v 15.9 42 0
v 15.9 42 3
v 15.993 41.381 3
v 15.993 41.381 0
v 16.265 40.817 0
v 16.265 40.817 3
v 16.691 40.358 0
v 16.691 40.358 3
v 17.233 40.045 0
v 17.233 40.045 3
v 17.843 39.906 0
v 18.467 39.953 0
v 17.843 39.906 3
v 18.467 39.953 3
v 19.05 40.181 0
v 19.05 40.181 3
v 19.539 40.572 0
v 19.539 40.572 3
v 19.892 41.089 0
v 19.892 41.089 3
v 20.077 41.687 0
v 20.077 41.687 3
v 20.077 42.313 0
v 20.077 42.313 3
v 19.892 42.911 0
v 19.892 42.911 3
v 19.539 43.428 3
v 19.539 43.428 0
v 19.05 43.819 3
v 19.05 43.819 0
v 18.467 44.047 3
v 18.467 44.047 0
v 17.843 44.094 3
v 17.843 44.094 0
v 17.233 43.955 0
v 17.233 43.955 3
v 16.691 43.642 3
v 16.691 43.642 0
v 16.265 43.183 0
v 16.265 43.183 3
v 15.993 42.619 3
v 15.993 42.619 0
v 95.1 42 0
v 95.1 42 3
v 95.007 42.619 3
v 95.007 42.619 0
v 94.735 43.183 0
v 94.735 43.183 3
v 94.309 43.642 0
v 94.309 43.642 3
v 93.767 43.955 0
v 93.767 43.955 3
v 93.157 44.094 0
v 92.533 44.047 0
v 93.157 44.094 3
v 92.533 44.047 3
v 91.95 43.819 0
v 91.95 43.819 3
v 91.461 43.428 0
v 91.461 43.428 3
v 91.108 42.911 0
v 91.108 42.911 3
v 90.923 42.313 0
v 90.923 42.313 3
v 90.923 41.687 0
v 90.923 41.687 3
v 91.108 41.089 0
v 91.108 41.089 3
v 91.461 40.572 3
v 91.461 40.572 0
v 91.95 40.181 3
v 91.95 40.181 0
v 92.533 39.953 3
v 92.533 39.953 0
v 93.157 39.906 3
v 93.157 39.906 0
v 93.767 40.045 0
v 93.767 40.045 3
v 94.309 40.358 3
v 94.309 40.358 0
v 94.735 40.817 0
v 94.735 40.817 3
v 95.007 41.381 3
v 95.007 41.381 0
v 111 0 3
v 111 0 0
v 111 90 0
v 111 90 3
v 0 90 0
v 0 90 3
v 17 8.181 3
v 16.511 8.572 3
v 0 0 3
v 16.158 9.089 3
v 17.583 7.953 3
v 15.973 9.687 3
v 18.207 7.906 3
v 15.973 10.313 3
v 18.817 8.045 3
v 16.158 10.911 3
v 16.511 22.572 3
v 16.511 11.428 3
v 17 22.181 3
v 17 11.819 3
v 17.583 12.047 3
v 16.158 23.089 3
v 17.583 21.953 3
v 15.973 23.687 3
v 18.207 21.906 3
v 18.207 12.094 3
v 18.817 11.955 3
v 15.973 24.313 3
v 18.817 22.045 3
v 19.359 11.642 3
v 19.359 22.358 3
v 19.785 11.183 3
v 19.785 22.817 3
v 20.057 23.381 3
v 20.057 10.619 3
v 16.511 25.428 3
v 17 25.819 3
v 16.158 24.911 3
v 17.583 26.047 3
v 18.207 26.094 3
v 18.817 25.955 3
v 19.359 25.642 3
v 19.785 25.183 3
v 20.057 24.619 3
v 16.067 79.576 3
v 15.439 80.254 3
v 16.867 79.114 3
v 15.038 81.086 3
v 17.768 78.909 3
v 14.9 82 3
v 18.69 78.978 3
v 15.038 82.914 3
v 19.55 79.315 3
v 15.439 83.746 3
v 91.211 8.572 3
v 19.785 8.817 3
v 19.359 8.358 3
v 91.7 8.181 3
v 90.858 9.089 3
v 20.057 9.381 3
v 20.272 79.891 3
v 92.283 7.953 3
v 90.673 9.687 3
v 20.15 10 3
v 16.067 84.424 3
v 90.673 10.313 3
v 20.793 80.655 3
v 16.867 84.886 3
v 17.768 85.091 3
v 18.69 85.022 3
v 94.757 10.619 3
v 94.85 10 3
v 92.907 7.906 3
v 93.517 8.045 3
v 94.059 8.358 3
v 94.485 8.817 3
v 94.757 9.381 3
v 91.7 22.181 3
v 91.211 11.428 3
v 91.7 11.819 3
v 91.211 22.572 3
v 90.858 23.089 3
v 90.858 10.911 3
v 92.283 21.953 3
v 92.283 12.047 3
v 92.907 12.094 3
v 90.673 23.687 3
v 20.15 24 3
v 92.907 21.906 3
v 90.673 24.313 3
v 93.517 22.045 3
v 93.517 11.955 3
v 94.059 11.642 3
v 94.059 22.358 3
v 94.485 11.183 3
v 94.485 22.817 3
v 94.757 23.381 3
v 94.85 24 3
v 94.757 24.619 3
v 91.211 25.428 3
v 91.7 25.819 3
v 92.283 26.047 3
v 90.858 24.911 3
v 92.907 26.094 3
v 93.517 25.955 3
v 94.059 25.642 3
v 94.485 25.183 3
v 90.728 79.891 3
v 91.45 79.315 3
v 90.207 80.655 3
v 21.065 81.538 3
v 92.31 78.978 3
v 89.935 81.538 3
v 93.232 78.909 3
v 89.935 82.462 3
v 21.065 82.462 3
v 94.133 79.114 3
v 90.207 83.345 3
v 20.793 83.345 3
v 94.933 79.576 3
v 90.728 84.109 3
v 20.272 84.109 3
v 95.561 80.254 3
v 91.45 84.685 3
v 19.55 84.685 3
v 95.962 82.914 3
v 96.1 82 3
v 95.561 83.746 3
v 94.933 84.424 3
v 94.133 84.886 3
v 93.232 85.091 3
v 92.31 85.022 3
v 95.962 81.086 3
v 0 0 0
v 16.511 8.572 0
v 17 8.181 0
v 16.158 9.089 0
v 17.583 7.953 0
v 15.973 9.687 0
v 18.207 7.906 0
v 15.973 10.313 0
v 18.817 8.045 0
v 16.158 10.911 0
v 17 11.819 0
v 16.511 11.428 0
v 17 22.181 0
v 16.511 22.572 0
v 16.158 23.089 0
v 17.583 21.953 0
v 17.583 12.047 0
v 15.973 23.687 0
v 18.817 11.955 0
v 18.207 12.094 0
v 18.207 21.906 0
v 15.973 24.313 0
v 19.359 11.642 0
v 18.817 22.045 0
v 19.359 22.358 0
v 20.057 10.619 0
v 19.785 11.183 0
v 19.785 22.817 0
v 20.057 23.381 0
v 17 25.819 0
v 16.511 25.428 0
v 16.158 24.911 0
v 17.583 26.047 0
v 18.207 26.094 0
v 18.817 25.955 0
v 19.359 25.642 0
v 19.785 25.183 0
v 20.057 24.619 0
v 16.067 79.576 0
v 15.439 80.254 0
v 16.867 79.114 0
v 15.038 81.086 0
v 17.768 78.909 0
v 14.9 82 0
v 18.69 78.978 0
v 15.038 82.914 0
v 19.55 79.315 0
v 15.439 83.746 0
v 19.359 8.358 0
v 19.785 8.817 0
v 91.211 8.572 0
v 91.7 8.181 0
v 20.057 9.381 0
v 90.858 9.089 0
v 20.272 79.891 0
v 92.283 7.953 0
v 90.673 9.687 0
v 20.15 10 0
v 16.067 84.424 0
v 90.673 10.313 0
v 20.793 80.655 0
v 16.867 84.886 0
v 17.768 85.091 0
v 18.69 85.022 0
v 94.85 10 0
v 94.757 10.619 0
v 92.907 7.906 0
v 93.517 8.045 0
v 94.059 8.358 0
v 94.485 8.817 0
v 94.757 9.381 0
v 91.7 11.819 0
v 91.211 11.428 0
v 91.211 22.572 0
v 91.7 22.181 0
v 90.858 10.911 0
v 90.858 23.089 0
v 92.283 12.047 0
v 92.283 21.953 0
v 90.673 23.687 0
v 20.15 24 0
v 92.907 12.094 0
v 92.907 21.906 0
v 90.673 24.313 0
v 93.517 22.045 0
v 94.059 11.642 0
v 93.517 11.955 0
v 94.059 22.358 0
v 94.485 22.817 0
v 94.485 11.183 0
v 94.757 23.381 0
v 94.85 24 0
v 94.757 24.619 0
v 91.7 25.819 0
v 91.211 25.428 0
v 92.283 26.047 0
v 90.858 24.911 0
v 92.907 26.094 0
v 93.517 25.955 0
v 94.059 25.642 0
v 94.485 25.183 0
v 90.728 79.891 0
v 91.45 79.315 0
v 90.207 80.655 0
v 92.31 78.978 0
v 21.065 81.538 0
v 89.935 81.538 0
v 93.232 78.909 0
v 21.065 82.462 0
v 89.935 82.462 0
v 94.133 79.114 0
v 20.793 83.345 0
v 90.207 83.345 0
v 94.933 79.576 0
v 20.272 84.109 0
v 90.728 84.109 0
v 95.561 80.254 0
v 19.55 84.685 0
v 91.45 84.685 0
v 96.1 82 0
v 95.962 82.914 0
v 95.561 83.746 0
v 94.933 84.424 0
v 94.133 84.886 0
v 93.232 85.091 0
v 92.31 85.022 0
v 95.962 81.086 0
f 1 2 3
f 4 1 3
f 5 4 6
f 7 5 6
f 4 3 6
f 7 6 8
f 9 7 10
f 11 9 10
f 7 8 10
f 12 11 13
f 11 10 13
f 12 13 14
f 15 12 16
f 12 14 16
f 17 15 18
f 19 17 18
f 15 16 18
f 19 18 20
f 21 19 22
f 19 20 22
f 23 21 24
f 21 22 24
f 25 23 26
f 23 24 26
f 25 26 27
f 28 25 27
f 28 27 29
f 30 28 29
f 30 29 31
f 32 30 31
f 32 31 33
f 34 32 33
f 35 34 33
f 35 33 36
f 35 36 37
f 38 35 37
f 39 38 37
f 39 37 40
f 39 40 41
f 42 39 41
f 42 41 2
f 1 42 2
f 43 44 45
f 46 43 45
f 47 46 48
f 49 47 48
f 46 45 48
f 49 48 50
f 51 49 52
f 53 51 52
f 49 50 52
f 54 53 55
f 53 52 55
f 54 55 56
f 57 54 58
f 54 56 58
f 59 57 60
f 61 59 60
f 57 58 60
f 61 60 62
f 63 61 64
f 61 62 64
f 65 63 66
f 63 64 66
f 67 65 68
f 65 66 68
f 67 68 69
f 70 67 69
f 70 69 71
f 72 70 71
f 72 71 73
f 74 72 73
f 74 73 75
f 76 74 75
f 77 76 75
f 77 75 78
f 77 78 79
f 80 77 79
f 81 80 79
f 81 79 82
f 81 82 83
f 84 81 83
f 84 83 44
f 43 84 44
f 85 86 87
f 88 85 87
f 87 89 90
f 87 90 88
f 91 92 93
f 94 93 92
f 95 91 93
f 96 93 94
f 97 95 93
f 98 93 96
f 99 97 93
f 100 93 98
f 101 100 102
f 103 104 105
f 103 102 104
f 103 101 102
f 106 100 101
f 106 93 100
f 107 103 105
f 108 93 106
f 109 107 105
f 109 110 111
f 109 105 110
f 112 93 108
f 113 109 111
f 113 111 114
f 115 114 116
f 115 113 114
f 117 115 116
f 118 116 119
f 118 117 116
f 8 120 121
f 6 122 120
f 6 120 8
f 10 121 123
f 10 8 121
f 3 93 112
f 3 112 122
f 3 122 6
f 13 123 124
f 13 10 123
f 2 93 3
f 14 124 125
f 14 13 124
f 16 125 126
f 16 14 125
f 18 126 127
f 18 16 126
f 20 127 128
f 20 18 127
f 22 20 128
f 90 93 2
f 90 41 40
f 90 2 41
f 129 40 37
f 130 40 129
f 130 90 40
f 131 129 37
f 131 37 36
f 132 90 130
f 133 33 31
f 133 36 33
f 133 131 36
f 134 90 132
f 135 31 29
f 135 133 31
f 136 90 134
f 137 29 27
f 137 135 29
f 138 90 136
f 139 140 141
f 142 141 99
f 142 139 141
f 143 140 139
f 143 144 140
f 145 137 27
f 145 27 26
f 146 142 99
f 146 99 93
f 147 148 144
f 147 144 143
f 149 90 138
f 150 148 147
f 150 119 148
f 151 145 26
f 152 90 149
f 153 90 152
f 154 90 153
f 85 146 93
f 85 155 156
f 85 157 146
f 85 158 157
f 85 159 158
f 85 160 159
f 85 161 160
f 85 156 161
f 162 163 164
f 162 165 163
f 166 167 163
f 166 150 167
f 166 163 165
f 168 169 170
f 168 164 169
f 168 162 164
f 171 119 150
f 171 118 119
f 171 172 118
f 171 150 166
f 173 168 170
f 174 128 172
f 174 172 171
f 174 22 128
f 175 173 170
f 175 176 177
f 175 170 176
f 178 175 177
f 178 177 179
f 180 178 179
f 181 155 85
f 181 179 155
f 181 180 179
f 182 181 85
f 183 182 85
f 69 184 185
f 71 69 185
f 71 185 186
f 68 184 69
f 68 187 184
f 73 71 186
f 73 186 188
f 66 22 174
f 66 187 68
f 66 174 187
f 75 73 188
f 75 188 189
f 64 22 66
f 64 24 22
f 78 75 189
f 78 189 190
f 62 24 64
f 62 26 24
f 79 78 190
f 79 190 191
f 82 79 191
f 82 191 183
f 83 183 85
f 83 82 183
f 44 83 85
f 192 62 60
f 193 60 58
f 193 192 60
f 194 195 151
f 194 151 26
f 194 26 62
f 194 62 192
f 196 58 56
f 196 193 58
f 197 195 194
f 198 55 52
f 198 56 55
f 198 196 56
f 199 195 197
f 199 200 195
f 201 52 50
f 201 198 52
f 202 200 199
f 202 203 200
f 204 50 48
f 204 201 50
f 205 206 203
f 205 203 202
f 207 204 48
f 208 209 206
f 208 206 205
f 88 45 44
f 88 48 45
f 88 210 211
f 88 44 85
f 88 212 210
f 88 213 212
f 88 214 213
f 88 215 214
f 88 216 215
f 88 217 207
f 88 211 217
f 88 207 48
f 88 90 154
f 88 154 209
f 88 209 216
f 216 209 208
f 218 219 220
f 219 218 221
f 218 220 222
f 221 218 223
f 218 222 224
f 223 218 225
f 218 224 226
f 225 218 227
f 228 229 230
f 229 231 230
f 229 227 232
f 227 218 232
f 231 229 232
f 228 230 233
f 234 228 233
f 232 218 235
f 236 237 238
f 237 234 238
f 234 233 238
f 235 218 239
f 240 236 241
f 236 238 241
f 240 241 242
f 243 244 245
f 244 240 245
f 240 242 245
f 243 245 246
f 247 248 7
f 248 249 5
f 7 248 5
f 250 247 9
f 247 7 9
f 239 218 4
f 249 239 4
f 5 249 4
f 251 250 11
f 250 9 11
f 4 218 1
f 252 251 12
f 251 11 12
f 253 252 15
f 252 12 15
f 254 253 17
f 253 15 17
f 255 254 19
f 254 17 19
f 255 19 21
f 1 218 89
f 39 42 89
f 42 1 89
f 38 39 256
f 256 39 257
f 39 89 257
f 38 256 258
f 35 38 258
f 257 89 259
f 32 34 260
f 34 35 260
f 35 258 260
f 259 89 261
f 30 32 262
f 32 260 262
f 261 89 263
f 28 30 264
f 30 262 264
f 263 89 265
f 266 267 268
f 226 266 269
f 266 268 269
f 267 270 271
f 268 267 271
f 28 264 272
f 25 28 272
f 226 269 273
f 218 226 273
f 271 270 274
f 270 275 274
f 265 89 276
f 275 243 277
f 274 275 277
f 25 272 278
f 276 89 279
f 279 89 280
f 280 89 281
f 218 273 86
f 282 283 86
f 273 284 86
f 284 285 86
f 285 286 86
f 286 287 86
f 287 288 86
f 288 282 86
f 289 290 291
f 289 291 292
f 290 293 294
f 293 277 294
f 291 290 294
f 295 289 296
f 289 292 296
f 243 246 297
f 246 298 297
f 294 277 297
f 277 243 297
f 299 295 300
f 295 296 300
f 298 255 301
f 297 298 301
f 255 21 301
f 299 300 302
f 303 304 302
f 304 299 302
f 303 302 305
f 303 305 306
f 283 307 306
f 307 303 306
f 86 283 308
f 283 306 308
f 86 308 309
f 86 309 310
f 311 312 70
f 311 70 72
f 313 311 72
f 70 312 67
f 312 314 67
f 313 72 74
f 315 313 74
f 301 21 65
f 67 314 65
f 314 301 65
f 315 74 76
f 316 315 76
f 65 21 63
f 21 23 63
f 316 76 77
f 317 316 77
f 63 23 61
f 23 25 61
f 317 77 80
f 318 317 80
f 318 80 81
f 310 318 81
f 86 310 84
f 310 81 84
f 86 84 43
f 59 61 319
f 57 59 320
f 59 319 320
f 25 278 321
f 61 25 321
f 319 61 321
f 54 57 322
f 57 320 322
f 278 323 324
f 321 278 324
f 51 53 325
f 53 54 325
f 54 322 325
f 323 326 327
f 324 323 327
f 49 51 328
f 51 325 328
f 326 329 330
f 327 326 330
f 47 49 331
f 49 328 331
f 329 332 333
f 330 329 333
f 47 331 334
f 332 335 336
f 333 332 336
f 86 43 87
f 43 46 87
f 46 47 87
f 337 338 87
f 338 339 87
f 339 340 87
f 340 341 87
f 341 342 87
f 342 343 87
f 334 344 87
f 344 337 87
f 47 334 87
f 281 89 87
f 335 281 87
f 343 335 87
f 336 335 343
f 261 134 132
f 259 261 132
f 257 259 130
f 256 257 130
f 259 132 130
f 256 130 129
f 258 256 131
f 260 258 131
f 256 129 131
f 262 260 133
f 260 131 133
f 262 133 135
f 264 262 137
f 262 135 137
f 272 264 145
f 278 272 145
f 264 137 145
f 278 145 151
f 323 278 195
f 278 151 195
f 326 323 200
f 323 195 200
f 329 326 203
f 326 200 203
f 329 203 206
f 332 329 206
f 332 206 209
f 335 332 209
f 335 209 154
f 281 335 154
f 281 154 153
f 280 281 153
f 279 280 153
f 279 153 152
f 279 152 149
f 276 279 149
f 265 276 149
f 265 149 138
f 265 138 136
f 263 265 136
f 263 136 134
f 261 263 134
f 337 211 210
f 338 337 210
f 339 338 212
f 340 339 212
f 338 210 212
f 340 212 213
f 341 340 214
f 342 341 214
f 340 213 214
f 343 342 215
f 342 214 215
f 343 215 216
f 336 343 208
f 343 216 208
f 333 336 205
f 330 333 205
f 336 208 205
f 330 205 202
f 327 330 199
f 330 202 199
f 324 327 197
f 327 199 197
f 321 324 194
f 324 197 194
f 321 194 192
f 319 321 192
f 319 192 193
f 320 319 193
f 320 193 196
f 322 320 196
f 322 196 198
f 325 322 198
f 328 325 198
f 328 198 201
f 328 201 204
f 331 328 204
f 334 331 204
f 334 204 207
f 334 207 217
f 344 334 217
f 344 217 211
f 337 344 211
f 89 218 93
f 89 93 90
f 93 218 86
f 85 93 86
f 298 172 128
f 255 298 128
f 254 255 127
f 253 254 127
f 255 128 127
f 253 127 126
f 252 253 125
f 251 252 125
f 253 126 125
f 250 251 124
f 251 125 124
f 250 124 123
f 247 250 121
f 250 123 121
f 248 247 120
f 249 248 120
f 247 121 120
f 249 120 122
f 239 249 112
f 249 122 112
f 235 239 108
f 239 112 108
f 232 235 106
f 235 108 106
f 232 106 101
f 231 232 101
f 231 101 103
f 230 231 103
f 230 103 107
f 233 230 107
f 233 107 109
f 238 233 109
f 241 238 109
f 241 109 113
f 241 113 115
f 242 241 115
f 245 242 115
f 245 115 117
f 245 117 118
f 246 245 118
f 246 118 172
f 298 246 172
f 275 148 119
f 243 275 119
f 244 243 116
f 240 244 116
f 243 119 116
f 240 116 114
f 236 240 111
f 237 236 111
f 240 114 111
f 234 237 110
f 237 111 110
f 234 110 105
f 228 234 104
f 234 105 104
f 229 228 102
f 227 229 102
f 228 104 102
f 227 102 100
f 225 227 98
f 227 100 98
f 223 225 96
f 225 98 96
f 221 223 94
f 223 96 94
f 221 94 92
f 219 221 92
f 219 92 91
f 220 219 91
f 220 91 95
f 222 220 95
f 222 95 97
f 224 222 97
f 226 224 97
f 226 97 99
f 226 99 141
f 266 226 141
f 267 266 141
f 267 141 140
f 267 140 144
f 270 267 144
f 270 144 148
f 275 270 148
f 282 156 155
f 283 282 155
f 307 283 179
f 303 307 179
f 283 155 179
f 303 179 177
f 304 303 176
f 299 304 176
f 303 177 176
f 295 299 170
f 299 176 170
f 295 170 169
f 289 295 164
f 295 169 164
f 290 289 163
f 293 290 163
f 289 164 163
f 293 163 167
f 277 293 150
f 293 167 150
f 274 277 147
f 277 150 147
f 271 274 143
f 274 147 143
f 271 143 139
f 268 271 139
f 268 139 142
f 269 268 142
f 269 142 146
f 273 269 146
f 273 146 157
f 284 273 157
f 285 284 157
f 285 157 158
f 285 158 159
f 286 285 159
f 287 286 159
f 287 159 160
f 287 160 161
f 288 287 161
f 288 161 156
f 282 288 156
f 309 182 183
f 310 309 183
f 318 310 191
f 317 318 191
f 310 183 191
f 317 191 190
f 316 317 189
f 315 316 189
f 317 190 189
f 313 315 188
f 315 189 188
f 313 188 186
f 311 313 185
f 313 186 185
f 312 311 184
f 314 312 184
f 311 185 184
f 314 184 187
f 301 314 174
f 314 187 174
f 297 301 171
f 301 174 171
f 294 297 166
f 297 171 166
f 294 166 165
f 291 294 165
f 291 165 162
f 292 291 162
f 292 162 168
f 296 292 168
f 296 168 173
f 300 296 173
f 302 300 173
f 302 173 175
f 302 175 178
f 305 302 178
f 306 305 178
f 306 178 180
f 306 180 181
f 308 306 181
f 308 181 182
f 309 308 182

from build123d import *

# Parameters (mm, degrees)
SZKIC1_W                    = 111
SZKIC1_H                    = 90
DODANIE_WYCI_GNI_CIE1_DEPTH = 3
SZKIC2_R                    = 2.1
WYTNIJ_WYCI_GNI_CIE2_DEPTH  = 143.933550995
SZKIC3_R                    = 3.1
SZKIC3_R_2                  = 2.1
WYTNIJ_WYCI_GNI_CIE3_DEPTH  = 143.933550995


with BuildPart() as part:
    # Szkic1 → Dodanie-wyciągnięcie1 (new body)
    with BuildSketch(Plane.XY):
        with Locations((55.5, 45)):
            Rectangle(SZKIC1_W, SZKIC1_H)
    extrude(amount=DODANIE_WYCI_GNI_CIE1_DEPTH)

    # Szkic2 → Wytnij-wyciągnięcie2 (cut, through all)
    with BuildSketch(Plane.XY.offset(3)):
        with Locations((18.05, 24)):
            Circle(SZKIC2_R)
        with Locations((18.05, 10)):
            Circle(SZKIC2_R)
        with Locations((92.75, 24)):
            Circle(SZKIC2_R)
        with Locations((92.75, 10)):
            Circle(SZKIC2_R)
    extrude(amount=-WYTNIJ_WYCI_GNI_CIE2_DEPTH, mode=Mode.SUBTRACT)

    # Szkic3 → Wytnij-wyciągnięcie3 (cut, through all)
    with BuildSketch(Plane.XY.offset(3)):
        with Locations((93, 82)):
            Circle(SZKIC3_R)
        with Locations((93, 42)):
            Circle(SZKIC3_R_2)
        with Locations(Location((18, 42, 0), (0, 0, 180))):
            Circle(SZKIC3_R_2)
        with Locations(Location((18, 82, 0), (0, 0, 180))):
            Circle(SZKIC3_R)
    extrude(amount=-WYTNIJ_WYCI_GNI_CIE3_DEPTH, mode=Mode.SUBTRACT)


solid = part.part
